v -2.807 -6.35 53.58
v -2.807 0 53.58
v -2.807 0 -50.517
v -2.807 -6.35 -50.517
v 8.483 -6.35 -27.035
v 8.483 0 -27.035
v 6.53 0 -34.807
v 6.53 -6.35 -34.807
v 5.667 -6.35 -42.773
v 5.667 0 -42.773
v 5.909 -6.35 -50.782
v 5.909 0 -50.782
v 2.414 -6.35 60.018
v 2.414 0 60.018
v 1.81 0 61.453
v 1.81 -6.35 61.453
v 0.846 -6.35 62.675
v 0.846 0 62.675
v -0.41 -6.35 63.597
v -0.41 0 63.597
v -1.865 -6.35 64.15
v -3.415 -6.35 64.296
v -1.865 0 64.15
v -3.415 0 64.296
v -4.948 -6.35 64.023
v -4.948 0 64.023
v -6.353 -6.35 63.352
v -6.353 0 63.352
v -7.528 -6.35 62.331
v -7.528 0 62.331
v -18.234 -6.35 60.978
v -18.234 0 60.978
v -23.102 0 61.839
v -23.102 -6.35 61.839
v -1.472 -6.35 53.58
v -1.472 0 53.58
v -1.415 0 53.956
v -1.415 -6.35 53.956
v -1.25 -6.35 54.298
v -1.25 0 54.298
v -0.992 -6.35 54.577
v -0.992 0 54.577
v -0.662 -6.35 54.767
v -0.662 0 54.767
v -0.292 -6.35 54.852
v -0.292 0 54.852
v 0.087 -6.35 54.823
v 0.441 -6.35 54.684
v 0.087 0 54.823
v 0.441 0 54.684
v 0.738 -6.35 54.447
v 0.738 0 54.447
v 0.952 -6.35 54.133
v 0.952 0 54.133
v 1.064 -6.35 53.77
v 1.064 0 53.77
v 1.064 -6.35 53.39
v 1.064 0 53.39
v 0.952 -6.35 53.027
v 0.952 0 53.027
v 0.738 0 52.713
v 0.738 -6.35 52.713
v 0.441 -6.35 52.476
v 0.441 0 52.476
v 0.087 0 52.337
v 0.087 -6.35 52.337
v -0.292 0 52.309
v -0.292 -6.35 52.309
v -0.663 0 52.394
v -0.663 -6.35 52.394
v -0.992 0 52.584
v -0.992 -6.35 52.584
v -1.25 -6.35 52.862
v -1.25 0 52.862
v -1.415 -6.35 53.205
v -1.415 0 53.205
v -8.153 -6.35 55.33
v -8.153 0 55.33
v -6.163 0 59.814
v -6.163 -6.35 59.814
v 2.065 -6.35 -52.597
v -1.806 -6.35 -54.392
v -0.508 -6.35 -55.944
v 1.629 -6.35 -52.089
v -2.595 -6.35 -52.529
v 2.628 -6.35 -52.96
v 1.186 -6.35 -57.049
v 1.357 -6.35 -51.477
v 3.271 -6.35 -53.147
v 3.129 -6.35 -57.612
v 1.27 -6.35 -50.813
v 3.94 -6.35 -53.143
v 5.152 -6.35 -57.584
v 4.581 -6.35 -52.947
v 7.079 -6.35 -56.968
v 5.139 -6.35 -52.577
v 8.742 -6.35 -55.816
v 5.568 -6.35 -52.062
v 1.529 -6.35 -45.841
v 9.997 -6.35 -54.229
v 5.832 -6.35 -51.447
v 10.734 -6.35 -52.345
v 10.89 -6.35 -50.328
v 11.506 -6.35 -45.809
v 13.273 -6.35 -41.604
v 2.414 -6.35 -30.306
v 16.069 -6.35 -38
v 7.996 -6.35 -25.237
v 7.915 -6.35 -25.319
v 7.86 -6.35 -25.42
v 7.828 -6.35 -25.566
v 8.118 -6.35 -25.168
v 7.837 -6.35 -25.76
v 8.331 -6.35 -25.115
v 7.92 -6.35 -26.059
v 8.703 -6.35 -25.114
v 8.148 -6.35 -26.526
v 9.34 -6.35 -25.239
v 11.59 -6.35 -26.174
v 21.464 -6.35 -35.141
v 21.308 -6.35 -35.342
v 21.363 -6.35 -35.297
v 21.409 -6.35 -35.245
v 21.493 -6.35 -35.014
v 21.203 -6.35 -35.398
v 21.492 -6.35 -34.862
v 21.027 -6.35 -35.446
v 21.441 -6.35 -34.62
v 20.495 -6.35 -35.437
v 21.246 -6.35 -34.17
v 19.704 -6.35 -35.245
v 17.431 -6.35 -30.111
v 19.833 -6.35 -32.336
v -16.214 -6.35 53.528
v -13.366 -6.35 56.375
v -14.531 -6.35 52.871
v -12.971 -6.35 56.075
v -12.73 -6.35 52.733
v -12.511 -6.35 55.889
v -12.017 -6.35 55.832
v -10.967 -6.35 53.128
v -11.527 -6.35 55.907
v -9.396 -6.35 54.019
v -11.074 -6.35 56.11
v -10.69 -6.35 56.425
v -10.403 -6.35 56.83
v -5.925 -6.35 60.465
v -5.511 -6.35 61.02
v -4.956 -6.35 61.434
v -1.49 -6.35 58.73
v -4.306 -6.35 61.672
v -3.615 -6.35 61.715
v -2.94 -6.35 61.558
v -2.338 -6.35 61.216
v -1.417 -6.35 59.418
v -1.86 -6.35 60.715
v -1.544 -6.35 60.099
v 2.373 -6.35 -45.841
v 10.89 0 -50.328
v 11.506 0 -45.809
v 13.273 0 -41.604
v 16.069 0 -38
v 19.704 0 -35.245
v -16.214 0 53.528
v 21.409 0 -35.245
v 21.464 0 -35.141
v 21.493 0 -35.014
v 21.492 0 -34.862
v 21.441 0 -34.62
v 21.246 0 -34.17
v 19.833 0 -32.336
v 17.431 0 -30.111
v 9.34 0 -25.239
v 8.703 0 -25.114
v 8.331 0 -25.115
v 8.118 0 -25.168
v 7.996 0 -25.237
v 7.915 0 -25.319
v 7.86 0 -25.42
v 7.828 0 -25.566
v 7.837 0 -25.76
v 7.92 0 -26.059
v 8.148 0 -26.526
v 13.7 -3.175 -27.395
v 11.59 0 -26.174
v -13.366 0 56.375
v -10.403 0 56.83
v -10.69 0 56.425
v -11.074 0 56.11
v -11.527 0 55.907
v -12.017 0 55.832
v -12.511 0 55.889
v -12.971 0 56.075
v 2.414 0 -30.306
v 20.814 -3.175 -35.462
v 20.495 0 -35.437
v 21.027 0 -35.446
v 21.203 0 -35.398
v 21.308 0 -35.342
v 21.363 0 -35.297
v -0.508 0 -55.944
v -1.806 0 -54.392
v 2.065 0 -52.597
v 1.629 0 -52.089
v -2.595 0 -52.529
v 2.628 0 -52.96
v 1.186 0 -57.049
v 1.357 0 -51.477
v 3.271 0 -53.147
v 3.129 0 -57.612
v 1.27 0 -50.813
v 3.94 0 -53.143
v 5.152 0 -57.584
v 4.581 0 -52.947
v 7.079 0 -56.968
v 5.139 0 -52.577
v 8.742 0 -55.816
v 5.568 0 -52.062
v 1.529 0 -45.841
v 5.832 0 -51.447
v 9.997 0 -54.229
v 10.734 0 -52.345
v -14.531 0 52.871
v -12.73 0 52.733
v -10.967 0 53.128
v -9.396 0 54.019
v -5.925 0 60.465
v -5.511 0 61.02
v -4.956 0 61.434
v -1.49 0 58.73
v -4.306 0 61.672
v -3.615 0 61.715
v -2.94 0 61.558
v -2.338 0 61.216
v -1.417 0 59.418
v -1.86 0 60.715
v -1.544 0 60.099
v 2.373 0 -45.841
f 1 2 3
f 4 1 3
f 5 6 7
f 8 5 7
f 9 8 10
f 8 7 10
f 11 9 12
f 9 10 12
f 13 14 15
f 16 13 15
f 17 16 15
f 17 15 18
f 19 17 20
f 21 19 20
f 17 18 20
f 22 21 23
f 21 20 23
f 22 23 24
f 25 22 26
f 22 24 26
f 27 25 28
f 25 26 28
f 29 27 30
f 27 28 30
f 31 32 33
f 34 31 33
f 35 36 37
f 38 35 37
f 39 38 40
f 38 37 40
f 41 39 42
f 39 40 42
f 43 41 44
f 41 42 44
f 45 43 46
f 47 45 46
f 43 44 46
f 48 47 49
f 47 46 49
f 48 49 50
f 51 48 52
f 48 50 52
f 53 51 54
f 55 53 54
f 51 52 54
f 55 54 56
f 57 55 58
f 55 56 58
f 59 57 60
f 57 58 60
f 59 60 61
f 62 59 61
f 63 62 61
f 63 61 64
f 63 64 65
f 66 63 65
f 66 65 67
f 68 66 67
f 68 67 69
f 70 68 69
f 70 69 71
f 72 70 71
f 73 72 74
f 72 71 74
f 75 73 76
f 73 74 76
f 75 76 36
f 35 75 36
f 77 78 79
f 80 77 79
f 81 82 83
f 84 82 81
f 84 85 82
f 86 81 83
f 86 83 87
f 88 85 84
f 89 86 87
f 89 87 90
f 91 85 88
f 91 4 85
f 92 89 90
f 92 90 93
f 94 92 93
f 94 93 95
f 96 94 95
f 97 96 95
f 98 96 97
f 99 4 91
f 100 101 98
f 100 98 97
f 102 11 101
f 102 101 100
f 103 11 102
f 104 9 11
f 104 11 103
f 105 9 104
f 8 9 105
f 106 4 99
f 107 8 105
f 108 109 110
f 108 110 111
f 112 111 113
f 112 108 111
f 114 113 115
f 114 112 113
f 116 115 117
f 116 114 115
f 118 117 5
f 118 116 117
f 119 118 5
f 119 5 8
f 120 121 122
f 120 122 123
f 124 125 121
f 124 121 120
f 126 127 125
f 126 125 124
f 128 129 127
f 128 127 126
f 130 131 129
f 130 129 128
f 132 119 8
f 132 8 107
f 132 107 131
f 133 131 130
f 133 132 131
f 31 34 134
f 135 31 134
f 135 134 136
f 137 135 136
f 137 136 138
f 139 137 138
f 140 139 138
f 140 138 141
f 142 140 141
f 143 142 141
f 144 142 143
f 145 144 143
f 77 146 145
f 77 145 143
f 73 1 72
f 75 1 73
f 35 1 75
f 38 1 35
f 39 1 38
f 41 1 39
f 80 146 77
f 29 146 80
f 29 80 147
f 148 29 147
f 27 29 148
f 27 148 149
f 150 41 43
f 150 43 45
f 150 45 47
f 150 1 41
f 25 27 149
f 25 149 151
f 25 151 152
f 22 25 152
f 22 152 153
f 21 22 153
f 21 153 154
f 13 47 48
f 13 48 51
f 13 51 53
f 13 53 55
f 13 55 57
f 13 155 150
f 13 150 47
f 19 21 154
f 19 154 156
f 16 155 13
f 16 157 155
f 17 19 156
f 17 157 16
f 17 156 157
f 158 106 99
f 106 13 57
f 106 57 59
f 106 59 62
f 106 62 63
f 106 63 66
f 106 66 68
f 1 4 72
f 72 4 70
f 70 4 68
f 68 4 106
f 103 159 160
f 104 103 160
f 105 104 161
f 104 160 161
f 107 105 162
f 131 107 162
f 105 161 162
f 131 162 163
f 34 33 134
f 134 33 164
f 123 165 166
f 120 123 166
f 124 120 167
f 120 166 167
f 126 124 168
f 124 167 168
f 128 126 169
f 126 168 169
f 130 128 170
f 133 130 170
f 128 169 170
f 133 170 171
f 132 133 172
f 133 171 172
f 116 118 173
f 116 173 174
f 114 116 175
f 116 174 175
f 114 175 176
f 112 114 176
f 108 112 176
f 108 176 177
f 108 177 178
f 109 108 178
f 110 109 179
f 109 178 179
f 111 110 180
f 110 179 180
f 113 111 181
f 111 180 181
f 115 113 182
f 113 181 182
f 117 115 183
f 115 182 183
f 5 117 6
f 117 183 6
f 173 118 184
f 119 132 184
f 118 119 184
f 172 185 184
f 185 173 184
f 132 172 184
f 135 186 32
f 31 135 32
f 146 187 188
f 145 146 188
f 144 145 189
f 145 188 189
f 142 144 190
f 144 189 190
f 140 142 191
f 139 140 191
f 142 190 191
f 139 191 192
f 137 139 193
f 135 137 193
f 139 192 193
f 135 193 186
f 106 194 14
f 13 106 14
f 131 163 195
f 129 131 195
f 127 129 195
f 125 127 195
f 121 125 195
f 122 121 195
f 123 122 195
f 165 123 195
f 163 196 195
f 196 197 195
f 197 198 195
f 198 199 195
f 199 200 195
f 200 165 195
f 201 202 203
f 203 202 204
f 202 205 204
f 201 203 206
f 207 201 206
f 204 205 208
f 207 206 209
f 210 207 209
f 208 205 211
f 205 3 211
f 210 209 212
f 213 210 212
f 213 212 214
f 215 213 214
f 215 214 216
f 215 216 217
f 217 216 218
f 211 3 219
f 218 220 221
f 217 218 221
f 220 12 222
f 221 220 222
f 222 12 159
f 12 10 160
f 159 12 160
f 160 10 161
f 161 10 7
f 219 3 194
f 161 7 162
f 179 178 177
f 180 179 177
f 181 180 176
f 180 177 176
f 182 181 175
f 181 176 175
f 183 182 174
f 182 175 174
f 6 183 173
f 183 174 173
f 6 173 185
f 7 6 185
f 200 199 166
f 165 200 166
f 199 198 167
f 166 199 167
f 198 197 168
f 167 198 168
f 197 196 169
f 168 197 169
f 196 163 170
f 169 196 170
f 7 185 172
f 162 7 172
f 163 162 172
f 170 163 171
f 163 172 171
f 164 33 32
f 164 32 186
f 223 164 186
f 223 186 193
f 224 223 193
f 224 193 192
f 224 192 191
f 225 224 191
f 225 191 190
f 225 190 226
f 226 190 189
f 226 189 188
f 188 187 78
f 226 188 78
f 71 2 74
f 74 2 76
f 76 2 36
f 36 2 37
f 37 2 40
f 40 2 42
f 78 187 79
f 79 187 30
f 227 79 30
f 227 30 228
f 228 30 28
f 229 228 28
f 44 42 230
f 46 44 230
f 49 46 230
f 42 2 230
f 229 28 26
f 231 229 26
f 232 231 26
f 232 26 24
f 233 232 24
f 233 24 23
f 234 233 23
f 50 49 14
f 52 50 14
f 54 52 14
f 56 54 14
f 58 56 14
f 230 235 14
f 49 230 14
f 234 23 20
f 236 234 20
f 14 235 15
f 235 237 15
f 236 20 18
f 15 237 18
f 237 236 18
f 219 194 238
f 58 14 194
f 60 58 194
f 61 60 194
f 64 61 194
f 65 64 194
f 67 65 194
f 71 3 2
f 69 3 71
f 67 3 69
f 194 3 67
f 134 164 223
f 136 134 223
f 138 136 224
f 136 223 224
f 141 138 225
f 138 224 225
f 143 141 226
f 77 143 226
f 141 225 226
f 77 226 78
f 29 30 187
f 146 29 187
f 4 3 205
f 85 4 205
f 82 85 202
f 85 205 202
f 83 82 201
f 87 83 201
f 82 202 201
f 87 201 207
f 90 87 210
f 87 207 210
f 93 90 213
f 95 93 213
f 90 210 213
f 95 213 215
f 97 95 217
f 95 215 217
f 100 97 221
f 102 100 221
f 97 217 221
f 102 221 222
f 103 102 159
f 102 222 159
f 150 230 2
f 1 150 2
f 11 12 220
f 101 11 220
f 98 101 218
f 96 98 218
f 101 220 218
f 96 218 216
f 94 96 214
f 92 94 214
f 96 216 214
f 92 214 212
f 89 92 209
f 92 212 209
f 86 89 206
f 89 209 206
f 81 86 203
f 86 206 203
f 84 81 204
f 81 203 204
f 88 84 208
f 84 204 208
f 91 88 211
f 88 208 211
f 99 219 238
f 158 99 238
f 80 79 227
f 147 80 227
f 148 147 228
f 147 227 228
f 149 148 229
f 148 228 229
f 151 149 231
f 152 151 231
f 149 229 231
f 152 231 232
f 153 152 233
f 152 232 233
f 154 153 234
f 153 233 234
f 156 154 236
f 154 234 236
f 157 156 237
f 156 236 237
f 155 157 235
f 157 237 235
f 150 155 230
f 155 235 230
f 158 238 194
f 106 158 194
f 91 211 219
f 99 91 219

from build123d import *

# Parameters (mm, degrees)
F1_DEPTH = 6.35


with BuildPart() as f1:
    # F0 (on Front) → F1 (new body)
    with BuildSketch(Plane.XZ):
        with BuildLine():
            add(Edge.make_bspline(
                [(19.70388, -35.244793), (21.082963, -35.68799), (21.408843, -35.244793)],
                knots=[5.702342, 5.702342, 5.702342, 6.283185, 6.283185, 6.283185], degree=2, weights=[1, 0.958123, 1]))
            add(Edge.make_bspline(
                [(21.408843, -35.244793), (22.889381, -33.23126), (13.700206, -27.394908), (4.51103, -21.558557), (8.483238, -27.03531)],
                knots=[0, 0, 0, 1.872025, 1.872025, 3.74405, 3.74405, 3.74405], degree=2, weights=[1, 0.593003, 1, 0.593003, 1]))
            add(Edge.make_bspline(
                [(8.483238, -27.03531), (12.836846, -33.037926), (19.70388, -35.244793)],
                knots=[3.74405, 3.74405, 3.74405, 5.702342, 5.702342, 5.702342], degree=2, weights=[1, 0.557732, 1]))
        make_face()
        with BuildLine():
            add(Edge.make_bspline(
                [(8.483238, -27.03531), (12.836846, -33.037926), (19.70388, -35.244793)],
                knots=[3.74405, 3.74405, 3.74405, 5.702342, 5.702342, 5.702342], degree=2, weights=[1, 0.557732, 1]))
            ThreePointArc((8.483238, -27.03531), (5.961038, -38.774792), (5.909106, -50.78205))
            ThreePointArc((5.909106, -50.78205), (3.605804, -53.169076), (1.270367, -50.813482))
            Line((1.270367, -50.813482), (1.529406, -45.840777))
            Line((1.529406, -45.840777), (2.373331, -45.840777))
            Line((2.373331, -45.840777), (2.413637, -30.305893))
            Line((2.413637, -30.305893), (2.413637, 53.580318))
            Line((2.413637, 53.580318), (1.078173, 53.580318))
            ThreePointArc((1.078173, 53.580318), (-0.196726, 52.305418), (-1.471626, 53.580318))
            Line((-1.471626, 53.580318), (-2.807089, 53.580318))
            Line((-2.807089, 53.580318), (-2.807089, 0))
            Line((-2.807089, 0), (-2.807089, -50.517433))
            ThreePointArc((-2.807089, -50.517433), (4.141661, -57.67322), (10.890122, -50.328244))
            ThreePointArc((10.890122, -50.328244), (13.272552, -41.603566), (19.70388, -35.244793))
        make_face()
        with BuildLine():
            Line((-1.490011, 58.729682), (-2.807089, 53.580318))
            Line((-2.807089, 53.580318), (-1.471626, 53.580318))
            ThreePointArc((-1.471626, 53.580318), (-0.196726, 54.855217), (1.078173, 53.580318))
            Line((1.078173, 53.580318), (2.413637, 53.580318))
            Line((2.413637, 53.580318), (2.413637, 60.018133))
            ThreePointArc((2.413637, 60.018133), (-1.864794, 64.15004), (-7.527756, 62.331114))
            Line((-7.527756, 62.331114), (-10.403354, 56.82997))
            ThreePointArc((-10.403354, 56.82997), (-11.769607, 55.853188), (-13.365839, 56.375489))
            Line((-13.365839, 56.375489), (-18.233759, 60.978491))
            Line((-18.233759, 60.978491), (-23.101682, 61.839484))
            Line((-23.101682, 61.839484), (-16.213737, 53.52759))
            ThreePointArc((-16.213737, 53.52759), (-11.833793, 52.865189), (-8.152885, 55.329658))
            Line((-8.152885, 55.329658), (-6.162923, 59.814464))
            ThreePointArc((-6.162923, 59.814464), (-3.271841, 61.661231), (-1.490011, 58.729682))
        make_face()
    extrude(amount=F1_DEPTH)


solid = f1.part
